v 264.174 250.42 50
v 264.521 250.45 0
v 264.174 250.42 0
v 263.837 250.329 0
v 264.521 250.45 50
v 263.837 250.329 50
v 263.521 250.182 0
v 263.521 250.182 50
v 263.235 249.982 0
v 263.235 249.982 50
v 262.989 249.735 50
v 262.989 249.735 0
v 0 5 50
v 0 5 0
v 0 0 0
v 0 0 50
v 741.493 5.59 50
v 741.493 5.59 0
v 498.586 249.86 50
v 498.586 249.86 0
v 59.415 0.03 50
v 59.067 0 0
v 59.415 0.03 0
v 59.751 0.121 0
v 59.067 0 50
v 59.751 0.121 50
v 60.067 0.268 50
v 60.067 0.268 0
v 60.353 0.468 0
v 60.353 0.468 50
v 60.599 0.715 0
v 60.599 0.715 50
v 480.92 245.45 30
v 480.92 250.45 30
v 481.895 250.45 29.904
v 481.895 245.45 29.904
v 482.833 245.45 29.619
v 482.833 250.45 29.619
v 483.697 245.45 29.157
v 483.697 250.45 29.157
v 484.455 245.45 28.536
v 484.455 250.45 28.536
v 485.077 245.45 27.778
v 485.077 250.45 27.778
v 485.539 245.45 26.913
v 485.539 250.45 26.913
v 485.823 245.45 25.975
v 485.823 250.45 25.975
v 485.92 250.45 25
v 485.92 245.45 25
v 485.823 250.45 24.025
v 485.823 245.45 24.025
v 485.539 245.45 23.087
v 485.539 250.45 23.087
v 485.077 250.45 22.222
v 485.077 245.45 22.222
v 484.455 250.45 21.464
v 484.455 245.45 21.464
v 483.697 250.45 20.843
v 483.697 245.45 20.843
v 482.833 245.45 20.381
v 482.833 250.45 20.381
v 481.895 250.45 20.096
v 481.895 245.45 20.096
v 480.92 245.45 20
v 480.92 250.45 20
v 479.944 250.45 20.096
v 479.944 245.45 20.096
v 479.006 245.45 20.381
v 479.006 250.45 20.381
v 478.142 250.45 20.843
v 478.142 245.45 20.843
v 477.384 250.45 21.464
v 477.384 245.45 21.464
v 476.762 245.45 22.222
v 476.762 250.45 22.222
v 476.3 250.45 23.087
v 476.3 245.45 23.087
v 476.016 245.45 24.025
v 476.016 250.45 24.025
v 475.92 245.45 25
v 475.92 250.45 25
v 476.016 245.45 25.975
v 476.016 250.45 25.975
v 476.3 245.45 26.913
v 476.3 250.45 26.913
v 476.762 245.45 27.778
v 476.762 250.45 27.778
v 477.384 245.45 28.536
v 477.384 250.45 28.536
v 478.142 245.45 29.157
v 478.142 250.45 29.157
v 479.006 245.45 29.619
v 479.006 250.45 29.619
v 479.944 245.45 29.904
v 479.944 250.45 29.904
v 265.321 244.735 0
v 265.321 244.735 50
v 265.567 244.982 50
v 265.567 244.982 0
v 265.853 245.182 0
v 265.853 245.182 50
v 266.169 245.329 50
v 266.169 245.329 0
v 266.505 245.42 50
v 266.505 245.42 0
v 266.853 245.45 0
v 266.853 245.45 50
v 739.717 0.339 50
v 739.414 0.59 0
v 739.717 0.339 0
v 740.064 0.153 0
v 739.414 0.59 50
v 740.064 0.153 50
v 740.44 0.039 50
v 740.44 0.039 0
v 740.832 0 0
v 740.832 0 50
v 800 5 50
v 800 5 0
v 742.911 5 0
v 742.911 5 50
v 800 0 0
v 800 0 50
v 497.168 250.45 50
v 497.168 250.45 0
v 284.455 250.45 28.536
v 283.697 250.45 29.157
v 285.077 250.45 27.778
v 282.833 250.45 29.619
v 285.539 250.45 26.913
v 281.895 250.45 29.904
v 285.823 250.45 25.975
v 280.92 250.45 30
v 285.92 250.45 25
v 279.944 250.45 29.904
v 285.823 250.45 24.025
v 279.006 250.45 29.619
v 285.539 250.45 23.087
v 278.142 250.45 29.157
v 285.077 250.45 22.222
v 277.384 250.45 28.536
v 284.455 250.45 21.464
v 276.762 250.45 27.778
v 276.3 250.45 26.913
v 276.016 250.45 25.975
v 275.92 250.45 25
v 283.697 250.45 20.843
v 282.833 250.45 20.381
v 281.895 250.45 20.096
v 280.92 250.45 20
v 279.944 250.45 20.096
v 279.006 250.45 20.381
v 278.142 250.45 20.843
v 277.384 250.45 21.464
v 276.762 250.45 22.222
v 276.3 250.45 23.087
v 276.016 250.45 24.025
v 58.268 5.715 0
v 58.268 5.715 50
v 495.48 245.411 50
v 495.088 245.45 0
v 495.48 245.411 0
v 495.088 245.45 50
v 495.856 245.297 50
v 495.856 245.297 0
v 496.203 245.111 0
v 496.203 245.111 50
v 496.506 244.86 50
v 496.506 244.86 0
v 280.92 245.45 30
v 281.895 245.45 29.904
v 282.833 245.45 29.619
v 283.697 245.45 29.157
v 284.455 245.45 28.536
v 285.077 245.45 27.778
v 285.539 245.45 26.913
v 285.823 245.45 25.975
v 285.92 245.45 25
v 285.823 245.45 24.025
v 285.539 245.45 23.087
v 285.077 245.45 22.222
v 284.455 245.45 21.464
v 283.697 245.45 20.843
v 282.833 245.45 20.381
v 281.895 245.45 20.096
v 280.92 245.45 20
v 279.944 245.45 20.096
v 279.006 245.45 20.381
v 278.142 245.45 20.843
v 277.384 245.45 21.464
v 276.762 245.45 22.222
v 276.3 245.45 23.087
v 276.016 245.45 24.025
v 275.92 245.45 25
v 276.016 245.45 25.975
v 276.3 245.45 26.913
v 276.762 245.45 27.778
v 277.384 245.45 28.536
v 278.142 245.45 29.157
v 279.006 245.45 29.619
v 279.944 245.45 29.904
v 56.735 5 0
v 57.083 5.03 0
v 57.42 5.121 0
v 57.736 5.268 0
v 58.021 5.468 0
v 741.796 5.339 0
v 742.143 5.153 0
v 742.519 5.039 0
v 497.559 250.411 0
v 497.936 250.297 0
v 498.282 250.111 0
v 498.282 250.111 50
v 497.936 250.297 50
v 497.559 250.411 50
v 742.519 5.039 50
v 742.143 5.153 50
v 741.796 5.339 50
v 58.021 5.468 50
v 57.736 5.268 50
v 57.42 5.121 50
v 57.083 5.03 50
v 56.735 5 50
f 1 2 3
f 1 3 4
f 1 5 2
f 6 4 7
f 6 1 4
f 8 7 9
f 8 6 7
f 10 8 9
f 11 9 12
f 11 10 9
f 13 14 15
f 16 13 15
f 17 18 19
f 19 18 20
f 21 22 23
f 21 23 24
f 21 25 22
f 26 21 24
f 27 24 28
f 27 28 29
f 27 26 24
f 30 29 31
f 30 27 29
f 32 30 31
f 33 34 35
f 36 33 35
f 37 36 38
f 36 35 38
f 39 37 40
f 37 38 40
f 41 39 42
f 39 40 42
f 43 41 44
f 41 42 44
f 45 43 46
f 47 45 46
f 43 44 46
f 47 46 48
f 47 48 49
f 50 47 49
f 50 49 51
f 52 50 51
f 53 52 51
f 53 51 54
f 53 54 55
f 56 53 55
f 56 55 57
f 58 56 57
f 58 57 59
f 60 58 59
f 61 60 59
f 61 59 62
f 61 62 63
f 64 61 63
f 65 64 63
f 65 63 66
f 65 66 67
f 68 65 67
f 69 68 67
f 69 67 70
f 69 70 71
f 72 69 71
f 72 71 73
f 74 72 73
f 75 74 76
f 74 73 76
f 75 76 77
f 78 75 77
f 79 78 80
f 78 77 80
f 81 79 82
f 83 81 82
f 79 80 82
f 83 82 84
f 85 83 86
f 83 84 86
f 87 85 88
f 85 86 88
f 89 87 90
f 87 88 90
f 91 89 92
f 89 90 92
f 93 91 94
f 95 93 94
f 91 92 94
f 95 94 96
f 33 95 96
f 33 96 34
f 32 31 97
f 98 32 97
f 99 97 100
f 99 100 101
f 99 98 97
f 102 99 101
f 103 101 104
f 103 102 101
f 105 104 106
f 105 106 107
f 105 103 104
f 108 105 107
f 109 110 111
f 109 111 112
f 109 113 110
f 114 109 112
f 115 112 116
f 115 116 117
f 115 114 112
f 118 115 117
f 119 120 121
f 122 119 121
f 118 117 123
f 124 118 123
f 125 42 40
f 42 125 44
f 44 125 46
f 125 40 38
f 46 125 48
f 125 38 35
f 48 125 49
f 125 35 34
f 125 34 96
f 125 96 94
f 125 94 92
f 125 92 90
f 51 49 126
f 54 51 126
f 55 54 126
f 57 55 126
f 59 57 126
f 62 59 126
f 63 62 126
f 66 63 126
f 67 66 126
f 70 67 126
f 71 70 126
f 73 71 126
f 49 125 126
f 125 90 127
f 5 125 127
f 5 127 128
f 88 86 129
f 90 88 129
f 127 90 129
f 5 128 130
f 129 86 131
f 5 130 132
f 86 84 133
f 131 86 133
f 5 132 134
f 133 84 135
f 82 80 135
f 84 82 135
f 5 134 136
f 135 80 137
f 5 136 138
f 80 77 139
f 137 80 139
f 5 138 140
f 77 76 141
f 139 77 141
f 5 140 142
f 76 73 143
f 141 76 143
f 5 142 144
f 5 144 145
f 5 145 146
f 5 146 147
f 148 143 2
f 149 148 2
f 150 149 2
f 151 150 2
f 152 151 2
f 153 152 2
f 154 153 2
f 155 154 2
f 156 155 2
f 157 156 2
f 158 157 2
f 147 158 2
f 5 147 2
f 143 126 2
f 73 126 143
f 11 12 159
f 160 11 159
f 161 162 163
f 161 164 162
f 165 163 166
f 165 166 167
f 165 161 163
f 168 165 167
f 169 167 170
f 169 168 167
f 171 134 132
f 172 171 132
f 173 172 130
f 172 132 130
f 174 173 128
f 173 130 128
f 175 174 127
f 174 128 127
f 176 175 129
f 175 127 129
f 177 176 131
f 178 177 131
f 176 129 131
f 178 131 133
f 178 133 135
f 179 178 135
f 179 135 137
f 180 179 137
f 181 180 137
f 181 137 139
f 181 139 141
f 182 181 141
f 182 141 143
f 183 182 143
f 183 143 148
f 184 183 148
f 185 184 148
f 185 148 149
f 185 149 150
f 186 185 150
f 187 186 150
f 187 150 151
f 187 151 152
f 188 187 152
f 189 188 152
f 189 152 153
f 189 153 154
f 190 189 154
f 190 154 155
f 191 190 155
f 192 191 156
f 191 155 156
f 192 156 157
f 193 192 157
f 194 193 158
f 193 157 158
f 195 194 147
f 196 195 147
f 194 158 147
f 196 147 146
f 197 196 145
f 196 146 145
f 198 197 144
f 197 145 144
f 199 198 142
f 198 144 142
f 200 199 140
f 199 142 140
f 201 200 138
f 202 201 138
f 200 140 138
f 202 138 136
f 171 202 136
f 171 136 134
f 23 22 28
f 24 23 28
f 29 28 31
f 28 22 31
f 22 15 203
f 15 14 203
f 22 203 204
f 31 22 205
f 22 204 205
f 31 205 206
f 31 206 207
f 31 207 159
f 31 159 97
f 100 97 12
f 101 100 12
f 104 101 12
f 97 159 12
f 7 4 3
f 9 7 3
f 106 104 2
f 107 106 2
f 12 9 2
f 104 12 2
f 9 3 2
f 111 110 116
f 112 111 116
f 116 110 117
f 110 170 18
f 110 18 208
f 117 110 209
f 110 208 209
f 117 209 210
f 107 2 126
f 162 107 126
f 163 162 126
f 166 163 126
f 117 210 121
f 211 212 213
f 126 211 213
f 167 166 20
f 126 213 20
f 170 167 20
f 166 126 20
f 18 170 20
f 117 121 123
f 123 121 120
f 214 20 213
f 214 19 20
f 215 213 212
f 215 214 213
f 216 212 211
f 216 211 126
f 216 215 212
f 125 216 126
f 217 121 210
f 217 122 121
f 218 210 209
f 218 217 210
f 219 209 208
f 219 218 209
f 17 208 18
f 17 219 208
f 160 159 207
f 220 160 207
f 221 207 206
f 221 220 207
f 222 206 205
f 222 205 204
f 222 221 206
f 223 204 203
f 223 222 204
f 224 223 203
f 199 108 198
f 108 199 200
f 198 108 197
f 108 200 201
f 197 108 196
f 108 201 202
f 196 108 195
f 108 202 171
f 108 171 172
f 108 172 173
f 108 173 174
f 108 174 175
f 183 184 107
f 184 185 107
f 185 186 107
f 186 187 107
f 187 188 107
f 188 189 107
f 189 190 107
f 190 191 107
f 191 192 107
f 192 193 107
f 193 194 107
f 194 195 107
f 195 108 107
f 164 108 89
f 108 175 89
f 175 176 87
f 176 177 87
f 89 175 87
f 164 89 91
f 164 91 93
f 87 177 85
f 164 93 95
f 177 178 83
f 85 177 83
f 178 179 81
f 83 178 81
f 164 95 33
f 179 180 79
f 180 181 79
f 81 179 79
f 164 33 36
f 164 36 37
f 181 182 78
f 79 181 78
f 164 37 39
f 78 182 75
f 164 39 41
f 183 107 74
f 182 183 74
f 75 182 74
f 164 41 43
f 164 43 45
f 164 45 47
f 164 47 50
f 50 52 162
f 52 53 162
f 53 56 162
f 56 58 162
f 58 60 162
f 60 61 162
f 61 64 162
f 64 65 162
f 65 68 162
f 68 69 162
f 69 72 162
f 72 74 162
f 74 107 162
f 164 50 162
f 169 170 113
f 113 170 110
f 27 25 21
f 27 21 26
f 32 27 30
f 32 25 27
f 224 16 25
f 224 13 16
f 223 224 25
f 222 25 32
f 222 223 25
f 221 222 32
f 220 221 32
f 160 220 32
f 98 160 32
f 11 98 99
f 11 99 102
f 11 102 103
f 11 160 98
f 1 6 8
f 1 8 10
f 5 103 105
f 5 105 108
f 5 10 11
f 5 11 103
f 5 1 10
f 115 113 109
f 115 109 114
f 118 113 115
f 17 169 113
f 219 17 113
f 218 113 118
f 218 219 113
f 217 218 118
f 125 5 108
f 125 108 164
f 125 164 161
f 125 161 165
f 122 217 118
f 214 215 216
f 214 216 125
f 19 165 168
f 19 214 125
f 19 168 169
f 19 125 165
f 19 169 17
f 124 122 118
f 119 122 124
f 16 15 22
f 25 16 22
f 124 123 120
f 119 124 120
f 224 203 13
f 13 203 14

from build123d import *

# Parameters (mm, degrees)
DODANIE_WYCI_GNI_CIE1_DEPTH = 50
ZAOKR_GLENIE1_R             = 2
WYTNIJ_WYCI_GNI_CIE1_REACH  = 841.777
SZKIC2_R                    = 5


with BuildPart() as part:
    # Szkic1 → Dodanie-wyciągnięcie1 (new body)
    with BuildSketch(Plane.XY):
        Polygon((0, 0), (60, 0), (265.92, 245.45), (495.92, 245.45), (740, 0), (800, 0), (800, 5), (742.079269467, 5), (497.999269467, 250.45), (263.588192414, 250.45), (57.668192414, 5), (0, 5), align=None)
    extrude(amount=DODANIE_WYCI_GNI_CIE1_DEPTH)

    # Zaokrąglenie1
    zaokr_glenie1_edges = [part.edges().sort_by_distance(p)[0] for p in [
        (57.668192414, 5, 25),
        (263.588192414, 250.45, 25),
        (497.999269467, 250.45, 25),
        (742.079269467, 5, 25),
        (740, 0, 25),
        (495.92, 245.45, 25),
        (265.92, 245.45, 25),
        (60, 0, 25),
    ]]
    fillet(zaokr_glenie1_edges, radius=ZAOKR_GLENIE1_R)

    # Szkic2 → Wytnij-wyciągnięcie1 (cut, up to next)
    with BuildSketch(Plane(origin=(0, 250.45, 0), x_dir=(1, 0, 0), z_dir=(0, 1, 0)), mode=Mode.PRIVATE) as wytnij_wyci_gni_cie1_sk1:
        with Locations(Location((480.919525398, -24.999999896, 0), (0, 0, 270))):
            Circle(SZKIC2_R)
    wytnij_wyci_gni_cie1_tool1 = extrude(wytnij_wyci_gni_cie1_sk1.sketch, amount=-WYTNIJ_WYCI_GNI_CIE1_REACH, mode=Mode.PRIVATE) & part.part
    # Szkic2 → Wytnij-wyciągnięcie1 (cut, up to next)
    with BuildSketch(Plane(origin=(0, 250.45, 0), x_dir=(1, 0, 0), z_dir=(0, 1, 0)), mode=Mode.PRIVATE) as wytnij_wyci_gni_cie1_sk2:
        with Locations(Location((280.919525398, -24.999999896, 0), (0, 0, 270))):
            Circle(SZKIC2_R)
    wytnij_wyci_gni_cie1_tool2 = extrude(wytnij_wyci_gni_cie1_sk2.sketch, amount=-WYTNIJ_WYCI_GNI_CIE1_REACH, mode=Mode.PRIVATE) & part.part
    add(wytnij_wyci_gni_cie1_tool1.solids().sort_by_distance((480.919525, 250.45, 25))[0], mode=Mode.SUBTRACT)
    add(wytnij_wyci_gni_cie1_tool2.solids().sort_by_distance((280.919525, 250.45, 25))[0], mode=Mode.SUBTRACT)


solid = part.part
